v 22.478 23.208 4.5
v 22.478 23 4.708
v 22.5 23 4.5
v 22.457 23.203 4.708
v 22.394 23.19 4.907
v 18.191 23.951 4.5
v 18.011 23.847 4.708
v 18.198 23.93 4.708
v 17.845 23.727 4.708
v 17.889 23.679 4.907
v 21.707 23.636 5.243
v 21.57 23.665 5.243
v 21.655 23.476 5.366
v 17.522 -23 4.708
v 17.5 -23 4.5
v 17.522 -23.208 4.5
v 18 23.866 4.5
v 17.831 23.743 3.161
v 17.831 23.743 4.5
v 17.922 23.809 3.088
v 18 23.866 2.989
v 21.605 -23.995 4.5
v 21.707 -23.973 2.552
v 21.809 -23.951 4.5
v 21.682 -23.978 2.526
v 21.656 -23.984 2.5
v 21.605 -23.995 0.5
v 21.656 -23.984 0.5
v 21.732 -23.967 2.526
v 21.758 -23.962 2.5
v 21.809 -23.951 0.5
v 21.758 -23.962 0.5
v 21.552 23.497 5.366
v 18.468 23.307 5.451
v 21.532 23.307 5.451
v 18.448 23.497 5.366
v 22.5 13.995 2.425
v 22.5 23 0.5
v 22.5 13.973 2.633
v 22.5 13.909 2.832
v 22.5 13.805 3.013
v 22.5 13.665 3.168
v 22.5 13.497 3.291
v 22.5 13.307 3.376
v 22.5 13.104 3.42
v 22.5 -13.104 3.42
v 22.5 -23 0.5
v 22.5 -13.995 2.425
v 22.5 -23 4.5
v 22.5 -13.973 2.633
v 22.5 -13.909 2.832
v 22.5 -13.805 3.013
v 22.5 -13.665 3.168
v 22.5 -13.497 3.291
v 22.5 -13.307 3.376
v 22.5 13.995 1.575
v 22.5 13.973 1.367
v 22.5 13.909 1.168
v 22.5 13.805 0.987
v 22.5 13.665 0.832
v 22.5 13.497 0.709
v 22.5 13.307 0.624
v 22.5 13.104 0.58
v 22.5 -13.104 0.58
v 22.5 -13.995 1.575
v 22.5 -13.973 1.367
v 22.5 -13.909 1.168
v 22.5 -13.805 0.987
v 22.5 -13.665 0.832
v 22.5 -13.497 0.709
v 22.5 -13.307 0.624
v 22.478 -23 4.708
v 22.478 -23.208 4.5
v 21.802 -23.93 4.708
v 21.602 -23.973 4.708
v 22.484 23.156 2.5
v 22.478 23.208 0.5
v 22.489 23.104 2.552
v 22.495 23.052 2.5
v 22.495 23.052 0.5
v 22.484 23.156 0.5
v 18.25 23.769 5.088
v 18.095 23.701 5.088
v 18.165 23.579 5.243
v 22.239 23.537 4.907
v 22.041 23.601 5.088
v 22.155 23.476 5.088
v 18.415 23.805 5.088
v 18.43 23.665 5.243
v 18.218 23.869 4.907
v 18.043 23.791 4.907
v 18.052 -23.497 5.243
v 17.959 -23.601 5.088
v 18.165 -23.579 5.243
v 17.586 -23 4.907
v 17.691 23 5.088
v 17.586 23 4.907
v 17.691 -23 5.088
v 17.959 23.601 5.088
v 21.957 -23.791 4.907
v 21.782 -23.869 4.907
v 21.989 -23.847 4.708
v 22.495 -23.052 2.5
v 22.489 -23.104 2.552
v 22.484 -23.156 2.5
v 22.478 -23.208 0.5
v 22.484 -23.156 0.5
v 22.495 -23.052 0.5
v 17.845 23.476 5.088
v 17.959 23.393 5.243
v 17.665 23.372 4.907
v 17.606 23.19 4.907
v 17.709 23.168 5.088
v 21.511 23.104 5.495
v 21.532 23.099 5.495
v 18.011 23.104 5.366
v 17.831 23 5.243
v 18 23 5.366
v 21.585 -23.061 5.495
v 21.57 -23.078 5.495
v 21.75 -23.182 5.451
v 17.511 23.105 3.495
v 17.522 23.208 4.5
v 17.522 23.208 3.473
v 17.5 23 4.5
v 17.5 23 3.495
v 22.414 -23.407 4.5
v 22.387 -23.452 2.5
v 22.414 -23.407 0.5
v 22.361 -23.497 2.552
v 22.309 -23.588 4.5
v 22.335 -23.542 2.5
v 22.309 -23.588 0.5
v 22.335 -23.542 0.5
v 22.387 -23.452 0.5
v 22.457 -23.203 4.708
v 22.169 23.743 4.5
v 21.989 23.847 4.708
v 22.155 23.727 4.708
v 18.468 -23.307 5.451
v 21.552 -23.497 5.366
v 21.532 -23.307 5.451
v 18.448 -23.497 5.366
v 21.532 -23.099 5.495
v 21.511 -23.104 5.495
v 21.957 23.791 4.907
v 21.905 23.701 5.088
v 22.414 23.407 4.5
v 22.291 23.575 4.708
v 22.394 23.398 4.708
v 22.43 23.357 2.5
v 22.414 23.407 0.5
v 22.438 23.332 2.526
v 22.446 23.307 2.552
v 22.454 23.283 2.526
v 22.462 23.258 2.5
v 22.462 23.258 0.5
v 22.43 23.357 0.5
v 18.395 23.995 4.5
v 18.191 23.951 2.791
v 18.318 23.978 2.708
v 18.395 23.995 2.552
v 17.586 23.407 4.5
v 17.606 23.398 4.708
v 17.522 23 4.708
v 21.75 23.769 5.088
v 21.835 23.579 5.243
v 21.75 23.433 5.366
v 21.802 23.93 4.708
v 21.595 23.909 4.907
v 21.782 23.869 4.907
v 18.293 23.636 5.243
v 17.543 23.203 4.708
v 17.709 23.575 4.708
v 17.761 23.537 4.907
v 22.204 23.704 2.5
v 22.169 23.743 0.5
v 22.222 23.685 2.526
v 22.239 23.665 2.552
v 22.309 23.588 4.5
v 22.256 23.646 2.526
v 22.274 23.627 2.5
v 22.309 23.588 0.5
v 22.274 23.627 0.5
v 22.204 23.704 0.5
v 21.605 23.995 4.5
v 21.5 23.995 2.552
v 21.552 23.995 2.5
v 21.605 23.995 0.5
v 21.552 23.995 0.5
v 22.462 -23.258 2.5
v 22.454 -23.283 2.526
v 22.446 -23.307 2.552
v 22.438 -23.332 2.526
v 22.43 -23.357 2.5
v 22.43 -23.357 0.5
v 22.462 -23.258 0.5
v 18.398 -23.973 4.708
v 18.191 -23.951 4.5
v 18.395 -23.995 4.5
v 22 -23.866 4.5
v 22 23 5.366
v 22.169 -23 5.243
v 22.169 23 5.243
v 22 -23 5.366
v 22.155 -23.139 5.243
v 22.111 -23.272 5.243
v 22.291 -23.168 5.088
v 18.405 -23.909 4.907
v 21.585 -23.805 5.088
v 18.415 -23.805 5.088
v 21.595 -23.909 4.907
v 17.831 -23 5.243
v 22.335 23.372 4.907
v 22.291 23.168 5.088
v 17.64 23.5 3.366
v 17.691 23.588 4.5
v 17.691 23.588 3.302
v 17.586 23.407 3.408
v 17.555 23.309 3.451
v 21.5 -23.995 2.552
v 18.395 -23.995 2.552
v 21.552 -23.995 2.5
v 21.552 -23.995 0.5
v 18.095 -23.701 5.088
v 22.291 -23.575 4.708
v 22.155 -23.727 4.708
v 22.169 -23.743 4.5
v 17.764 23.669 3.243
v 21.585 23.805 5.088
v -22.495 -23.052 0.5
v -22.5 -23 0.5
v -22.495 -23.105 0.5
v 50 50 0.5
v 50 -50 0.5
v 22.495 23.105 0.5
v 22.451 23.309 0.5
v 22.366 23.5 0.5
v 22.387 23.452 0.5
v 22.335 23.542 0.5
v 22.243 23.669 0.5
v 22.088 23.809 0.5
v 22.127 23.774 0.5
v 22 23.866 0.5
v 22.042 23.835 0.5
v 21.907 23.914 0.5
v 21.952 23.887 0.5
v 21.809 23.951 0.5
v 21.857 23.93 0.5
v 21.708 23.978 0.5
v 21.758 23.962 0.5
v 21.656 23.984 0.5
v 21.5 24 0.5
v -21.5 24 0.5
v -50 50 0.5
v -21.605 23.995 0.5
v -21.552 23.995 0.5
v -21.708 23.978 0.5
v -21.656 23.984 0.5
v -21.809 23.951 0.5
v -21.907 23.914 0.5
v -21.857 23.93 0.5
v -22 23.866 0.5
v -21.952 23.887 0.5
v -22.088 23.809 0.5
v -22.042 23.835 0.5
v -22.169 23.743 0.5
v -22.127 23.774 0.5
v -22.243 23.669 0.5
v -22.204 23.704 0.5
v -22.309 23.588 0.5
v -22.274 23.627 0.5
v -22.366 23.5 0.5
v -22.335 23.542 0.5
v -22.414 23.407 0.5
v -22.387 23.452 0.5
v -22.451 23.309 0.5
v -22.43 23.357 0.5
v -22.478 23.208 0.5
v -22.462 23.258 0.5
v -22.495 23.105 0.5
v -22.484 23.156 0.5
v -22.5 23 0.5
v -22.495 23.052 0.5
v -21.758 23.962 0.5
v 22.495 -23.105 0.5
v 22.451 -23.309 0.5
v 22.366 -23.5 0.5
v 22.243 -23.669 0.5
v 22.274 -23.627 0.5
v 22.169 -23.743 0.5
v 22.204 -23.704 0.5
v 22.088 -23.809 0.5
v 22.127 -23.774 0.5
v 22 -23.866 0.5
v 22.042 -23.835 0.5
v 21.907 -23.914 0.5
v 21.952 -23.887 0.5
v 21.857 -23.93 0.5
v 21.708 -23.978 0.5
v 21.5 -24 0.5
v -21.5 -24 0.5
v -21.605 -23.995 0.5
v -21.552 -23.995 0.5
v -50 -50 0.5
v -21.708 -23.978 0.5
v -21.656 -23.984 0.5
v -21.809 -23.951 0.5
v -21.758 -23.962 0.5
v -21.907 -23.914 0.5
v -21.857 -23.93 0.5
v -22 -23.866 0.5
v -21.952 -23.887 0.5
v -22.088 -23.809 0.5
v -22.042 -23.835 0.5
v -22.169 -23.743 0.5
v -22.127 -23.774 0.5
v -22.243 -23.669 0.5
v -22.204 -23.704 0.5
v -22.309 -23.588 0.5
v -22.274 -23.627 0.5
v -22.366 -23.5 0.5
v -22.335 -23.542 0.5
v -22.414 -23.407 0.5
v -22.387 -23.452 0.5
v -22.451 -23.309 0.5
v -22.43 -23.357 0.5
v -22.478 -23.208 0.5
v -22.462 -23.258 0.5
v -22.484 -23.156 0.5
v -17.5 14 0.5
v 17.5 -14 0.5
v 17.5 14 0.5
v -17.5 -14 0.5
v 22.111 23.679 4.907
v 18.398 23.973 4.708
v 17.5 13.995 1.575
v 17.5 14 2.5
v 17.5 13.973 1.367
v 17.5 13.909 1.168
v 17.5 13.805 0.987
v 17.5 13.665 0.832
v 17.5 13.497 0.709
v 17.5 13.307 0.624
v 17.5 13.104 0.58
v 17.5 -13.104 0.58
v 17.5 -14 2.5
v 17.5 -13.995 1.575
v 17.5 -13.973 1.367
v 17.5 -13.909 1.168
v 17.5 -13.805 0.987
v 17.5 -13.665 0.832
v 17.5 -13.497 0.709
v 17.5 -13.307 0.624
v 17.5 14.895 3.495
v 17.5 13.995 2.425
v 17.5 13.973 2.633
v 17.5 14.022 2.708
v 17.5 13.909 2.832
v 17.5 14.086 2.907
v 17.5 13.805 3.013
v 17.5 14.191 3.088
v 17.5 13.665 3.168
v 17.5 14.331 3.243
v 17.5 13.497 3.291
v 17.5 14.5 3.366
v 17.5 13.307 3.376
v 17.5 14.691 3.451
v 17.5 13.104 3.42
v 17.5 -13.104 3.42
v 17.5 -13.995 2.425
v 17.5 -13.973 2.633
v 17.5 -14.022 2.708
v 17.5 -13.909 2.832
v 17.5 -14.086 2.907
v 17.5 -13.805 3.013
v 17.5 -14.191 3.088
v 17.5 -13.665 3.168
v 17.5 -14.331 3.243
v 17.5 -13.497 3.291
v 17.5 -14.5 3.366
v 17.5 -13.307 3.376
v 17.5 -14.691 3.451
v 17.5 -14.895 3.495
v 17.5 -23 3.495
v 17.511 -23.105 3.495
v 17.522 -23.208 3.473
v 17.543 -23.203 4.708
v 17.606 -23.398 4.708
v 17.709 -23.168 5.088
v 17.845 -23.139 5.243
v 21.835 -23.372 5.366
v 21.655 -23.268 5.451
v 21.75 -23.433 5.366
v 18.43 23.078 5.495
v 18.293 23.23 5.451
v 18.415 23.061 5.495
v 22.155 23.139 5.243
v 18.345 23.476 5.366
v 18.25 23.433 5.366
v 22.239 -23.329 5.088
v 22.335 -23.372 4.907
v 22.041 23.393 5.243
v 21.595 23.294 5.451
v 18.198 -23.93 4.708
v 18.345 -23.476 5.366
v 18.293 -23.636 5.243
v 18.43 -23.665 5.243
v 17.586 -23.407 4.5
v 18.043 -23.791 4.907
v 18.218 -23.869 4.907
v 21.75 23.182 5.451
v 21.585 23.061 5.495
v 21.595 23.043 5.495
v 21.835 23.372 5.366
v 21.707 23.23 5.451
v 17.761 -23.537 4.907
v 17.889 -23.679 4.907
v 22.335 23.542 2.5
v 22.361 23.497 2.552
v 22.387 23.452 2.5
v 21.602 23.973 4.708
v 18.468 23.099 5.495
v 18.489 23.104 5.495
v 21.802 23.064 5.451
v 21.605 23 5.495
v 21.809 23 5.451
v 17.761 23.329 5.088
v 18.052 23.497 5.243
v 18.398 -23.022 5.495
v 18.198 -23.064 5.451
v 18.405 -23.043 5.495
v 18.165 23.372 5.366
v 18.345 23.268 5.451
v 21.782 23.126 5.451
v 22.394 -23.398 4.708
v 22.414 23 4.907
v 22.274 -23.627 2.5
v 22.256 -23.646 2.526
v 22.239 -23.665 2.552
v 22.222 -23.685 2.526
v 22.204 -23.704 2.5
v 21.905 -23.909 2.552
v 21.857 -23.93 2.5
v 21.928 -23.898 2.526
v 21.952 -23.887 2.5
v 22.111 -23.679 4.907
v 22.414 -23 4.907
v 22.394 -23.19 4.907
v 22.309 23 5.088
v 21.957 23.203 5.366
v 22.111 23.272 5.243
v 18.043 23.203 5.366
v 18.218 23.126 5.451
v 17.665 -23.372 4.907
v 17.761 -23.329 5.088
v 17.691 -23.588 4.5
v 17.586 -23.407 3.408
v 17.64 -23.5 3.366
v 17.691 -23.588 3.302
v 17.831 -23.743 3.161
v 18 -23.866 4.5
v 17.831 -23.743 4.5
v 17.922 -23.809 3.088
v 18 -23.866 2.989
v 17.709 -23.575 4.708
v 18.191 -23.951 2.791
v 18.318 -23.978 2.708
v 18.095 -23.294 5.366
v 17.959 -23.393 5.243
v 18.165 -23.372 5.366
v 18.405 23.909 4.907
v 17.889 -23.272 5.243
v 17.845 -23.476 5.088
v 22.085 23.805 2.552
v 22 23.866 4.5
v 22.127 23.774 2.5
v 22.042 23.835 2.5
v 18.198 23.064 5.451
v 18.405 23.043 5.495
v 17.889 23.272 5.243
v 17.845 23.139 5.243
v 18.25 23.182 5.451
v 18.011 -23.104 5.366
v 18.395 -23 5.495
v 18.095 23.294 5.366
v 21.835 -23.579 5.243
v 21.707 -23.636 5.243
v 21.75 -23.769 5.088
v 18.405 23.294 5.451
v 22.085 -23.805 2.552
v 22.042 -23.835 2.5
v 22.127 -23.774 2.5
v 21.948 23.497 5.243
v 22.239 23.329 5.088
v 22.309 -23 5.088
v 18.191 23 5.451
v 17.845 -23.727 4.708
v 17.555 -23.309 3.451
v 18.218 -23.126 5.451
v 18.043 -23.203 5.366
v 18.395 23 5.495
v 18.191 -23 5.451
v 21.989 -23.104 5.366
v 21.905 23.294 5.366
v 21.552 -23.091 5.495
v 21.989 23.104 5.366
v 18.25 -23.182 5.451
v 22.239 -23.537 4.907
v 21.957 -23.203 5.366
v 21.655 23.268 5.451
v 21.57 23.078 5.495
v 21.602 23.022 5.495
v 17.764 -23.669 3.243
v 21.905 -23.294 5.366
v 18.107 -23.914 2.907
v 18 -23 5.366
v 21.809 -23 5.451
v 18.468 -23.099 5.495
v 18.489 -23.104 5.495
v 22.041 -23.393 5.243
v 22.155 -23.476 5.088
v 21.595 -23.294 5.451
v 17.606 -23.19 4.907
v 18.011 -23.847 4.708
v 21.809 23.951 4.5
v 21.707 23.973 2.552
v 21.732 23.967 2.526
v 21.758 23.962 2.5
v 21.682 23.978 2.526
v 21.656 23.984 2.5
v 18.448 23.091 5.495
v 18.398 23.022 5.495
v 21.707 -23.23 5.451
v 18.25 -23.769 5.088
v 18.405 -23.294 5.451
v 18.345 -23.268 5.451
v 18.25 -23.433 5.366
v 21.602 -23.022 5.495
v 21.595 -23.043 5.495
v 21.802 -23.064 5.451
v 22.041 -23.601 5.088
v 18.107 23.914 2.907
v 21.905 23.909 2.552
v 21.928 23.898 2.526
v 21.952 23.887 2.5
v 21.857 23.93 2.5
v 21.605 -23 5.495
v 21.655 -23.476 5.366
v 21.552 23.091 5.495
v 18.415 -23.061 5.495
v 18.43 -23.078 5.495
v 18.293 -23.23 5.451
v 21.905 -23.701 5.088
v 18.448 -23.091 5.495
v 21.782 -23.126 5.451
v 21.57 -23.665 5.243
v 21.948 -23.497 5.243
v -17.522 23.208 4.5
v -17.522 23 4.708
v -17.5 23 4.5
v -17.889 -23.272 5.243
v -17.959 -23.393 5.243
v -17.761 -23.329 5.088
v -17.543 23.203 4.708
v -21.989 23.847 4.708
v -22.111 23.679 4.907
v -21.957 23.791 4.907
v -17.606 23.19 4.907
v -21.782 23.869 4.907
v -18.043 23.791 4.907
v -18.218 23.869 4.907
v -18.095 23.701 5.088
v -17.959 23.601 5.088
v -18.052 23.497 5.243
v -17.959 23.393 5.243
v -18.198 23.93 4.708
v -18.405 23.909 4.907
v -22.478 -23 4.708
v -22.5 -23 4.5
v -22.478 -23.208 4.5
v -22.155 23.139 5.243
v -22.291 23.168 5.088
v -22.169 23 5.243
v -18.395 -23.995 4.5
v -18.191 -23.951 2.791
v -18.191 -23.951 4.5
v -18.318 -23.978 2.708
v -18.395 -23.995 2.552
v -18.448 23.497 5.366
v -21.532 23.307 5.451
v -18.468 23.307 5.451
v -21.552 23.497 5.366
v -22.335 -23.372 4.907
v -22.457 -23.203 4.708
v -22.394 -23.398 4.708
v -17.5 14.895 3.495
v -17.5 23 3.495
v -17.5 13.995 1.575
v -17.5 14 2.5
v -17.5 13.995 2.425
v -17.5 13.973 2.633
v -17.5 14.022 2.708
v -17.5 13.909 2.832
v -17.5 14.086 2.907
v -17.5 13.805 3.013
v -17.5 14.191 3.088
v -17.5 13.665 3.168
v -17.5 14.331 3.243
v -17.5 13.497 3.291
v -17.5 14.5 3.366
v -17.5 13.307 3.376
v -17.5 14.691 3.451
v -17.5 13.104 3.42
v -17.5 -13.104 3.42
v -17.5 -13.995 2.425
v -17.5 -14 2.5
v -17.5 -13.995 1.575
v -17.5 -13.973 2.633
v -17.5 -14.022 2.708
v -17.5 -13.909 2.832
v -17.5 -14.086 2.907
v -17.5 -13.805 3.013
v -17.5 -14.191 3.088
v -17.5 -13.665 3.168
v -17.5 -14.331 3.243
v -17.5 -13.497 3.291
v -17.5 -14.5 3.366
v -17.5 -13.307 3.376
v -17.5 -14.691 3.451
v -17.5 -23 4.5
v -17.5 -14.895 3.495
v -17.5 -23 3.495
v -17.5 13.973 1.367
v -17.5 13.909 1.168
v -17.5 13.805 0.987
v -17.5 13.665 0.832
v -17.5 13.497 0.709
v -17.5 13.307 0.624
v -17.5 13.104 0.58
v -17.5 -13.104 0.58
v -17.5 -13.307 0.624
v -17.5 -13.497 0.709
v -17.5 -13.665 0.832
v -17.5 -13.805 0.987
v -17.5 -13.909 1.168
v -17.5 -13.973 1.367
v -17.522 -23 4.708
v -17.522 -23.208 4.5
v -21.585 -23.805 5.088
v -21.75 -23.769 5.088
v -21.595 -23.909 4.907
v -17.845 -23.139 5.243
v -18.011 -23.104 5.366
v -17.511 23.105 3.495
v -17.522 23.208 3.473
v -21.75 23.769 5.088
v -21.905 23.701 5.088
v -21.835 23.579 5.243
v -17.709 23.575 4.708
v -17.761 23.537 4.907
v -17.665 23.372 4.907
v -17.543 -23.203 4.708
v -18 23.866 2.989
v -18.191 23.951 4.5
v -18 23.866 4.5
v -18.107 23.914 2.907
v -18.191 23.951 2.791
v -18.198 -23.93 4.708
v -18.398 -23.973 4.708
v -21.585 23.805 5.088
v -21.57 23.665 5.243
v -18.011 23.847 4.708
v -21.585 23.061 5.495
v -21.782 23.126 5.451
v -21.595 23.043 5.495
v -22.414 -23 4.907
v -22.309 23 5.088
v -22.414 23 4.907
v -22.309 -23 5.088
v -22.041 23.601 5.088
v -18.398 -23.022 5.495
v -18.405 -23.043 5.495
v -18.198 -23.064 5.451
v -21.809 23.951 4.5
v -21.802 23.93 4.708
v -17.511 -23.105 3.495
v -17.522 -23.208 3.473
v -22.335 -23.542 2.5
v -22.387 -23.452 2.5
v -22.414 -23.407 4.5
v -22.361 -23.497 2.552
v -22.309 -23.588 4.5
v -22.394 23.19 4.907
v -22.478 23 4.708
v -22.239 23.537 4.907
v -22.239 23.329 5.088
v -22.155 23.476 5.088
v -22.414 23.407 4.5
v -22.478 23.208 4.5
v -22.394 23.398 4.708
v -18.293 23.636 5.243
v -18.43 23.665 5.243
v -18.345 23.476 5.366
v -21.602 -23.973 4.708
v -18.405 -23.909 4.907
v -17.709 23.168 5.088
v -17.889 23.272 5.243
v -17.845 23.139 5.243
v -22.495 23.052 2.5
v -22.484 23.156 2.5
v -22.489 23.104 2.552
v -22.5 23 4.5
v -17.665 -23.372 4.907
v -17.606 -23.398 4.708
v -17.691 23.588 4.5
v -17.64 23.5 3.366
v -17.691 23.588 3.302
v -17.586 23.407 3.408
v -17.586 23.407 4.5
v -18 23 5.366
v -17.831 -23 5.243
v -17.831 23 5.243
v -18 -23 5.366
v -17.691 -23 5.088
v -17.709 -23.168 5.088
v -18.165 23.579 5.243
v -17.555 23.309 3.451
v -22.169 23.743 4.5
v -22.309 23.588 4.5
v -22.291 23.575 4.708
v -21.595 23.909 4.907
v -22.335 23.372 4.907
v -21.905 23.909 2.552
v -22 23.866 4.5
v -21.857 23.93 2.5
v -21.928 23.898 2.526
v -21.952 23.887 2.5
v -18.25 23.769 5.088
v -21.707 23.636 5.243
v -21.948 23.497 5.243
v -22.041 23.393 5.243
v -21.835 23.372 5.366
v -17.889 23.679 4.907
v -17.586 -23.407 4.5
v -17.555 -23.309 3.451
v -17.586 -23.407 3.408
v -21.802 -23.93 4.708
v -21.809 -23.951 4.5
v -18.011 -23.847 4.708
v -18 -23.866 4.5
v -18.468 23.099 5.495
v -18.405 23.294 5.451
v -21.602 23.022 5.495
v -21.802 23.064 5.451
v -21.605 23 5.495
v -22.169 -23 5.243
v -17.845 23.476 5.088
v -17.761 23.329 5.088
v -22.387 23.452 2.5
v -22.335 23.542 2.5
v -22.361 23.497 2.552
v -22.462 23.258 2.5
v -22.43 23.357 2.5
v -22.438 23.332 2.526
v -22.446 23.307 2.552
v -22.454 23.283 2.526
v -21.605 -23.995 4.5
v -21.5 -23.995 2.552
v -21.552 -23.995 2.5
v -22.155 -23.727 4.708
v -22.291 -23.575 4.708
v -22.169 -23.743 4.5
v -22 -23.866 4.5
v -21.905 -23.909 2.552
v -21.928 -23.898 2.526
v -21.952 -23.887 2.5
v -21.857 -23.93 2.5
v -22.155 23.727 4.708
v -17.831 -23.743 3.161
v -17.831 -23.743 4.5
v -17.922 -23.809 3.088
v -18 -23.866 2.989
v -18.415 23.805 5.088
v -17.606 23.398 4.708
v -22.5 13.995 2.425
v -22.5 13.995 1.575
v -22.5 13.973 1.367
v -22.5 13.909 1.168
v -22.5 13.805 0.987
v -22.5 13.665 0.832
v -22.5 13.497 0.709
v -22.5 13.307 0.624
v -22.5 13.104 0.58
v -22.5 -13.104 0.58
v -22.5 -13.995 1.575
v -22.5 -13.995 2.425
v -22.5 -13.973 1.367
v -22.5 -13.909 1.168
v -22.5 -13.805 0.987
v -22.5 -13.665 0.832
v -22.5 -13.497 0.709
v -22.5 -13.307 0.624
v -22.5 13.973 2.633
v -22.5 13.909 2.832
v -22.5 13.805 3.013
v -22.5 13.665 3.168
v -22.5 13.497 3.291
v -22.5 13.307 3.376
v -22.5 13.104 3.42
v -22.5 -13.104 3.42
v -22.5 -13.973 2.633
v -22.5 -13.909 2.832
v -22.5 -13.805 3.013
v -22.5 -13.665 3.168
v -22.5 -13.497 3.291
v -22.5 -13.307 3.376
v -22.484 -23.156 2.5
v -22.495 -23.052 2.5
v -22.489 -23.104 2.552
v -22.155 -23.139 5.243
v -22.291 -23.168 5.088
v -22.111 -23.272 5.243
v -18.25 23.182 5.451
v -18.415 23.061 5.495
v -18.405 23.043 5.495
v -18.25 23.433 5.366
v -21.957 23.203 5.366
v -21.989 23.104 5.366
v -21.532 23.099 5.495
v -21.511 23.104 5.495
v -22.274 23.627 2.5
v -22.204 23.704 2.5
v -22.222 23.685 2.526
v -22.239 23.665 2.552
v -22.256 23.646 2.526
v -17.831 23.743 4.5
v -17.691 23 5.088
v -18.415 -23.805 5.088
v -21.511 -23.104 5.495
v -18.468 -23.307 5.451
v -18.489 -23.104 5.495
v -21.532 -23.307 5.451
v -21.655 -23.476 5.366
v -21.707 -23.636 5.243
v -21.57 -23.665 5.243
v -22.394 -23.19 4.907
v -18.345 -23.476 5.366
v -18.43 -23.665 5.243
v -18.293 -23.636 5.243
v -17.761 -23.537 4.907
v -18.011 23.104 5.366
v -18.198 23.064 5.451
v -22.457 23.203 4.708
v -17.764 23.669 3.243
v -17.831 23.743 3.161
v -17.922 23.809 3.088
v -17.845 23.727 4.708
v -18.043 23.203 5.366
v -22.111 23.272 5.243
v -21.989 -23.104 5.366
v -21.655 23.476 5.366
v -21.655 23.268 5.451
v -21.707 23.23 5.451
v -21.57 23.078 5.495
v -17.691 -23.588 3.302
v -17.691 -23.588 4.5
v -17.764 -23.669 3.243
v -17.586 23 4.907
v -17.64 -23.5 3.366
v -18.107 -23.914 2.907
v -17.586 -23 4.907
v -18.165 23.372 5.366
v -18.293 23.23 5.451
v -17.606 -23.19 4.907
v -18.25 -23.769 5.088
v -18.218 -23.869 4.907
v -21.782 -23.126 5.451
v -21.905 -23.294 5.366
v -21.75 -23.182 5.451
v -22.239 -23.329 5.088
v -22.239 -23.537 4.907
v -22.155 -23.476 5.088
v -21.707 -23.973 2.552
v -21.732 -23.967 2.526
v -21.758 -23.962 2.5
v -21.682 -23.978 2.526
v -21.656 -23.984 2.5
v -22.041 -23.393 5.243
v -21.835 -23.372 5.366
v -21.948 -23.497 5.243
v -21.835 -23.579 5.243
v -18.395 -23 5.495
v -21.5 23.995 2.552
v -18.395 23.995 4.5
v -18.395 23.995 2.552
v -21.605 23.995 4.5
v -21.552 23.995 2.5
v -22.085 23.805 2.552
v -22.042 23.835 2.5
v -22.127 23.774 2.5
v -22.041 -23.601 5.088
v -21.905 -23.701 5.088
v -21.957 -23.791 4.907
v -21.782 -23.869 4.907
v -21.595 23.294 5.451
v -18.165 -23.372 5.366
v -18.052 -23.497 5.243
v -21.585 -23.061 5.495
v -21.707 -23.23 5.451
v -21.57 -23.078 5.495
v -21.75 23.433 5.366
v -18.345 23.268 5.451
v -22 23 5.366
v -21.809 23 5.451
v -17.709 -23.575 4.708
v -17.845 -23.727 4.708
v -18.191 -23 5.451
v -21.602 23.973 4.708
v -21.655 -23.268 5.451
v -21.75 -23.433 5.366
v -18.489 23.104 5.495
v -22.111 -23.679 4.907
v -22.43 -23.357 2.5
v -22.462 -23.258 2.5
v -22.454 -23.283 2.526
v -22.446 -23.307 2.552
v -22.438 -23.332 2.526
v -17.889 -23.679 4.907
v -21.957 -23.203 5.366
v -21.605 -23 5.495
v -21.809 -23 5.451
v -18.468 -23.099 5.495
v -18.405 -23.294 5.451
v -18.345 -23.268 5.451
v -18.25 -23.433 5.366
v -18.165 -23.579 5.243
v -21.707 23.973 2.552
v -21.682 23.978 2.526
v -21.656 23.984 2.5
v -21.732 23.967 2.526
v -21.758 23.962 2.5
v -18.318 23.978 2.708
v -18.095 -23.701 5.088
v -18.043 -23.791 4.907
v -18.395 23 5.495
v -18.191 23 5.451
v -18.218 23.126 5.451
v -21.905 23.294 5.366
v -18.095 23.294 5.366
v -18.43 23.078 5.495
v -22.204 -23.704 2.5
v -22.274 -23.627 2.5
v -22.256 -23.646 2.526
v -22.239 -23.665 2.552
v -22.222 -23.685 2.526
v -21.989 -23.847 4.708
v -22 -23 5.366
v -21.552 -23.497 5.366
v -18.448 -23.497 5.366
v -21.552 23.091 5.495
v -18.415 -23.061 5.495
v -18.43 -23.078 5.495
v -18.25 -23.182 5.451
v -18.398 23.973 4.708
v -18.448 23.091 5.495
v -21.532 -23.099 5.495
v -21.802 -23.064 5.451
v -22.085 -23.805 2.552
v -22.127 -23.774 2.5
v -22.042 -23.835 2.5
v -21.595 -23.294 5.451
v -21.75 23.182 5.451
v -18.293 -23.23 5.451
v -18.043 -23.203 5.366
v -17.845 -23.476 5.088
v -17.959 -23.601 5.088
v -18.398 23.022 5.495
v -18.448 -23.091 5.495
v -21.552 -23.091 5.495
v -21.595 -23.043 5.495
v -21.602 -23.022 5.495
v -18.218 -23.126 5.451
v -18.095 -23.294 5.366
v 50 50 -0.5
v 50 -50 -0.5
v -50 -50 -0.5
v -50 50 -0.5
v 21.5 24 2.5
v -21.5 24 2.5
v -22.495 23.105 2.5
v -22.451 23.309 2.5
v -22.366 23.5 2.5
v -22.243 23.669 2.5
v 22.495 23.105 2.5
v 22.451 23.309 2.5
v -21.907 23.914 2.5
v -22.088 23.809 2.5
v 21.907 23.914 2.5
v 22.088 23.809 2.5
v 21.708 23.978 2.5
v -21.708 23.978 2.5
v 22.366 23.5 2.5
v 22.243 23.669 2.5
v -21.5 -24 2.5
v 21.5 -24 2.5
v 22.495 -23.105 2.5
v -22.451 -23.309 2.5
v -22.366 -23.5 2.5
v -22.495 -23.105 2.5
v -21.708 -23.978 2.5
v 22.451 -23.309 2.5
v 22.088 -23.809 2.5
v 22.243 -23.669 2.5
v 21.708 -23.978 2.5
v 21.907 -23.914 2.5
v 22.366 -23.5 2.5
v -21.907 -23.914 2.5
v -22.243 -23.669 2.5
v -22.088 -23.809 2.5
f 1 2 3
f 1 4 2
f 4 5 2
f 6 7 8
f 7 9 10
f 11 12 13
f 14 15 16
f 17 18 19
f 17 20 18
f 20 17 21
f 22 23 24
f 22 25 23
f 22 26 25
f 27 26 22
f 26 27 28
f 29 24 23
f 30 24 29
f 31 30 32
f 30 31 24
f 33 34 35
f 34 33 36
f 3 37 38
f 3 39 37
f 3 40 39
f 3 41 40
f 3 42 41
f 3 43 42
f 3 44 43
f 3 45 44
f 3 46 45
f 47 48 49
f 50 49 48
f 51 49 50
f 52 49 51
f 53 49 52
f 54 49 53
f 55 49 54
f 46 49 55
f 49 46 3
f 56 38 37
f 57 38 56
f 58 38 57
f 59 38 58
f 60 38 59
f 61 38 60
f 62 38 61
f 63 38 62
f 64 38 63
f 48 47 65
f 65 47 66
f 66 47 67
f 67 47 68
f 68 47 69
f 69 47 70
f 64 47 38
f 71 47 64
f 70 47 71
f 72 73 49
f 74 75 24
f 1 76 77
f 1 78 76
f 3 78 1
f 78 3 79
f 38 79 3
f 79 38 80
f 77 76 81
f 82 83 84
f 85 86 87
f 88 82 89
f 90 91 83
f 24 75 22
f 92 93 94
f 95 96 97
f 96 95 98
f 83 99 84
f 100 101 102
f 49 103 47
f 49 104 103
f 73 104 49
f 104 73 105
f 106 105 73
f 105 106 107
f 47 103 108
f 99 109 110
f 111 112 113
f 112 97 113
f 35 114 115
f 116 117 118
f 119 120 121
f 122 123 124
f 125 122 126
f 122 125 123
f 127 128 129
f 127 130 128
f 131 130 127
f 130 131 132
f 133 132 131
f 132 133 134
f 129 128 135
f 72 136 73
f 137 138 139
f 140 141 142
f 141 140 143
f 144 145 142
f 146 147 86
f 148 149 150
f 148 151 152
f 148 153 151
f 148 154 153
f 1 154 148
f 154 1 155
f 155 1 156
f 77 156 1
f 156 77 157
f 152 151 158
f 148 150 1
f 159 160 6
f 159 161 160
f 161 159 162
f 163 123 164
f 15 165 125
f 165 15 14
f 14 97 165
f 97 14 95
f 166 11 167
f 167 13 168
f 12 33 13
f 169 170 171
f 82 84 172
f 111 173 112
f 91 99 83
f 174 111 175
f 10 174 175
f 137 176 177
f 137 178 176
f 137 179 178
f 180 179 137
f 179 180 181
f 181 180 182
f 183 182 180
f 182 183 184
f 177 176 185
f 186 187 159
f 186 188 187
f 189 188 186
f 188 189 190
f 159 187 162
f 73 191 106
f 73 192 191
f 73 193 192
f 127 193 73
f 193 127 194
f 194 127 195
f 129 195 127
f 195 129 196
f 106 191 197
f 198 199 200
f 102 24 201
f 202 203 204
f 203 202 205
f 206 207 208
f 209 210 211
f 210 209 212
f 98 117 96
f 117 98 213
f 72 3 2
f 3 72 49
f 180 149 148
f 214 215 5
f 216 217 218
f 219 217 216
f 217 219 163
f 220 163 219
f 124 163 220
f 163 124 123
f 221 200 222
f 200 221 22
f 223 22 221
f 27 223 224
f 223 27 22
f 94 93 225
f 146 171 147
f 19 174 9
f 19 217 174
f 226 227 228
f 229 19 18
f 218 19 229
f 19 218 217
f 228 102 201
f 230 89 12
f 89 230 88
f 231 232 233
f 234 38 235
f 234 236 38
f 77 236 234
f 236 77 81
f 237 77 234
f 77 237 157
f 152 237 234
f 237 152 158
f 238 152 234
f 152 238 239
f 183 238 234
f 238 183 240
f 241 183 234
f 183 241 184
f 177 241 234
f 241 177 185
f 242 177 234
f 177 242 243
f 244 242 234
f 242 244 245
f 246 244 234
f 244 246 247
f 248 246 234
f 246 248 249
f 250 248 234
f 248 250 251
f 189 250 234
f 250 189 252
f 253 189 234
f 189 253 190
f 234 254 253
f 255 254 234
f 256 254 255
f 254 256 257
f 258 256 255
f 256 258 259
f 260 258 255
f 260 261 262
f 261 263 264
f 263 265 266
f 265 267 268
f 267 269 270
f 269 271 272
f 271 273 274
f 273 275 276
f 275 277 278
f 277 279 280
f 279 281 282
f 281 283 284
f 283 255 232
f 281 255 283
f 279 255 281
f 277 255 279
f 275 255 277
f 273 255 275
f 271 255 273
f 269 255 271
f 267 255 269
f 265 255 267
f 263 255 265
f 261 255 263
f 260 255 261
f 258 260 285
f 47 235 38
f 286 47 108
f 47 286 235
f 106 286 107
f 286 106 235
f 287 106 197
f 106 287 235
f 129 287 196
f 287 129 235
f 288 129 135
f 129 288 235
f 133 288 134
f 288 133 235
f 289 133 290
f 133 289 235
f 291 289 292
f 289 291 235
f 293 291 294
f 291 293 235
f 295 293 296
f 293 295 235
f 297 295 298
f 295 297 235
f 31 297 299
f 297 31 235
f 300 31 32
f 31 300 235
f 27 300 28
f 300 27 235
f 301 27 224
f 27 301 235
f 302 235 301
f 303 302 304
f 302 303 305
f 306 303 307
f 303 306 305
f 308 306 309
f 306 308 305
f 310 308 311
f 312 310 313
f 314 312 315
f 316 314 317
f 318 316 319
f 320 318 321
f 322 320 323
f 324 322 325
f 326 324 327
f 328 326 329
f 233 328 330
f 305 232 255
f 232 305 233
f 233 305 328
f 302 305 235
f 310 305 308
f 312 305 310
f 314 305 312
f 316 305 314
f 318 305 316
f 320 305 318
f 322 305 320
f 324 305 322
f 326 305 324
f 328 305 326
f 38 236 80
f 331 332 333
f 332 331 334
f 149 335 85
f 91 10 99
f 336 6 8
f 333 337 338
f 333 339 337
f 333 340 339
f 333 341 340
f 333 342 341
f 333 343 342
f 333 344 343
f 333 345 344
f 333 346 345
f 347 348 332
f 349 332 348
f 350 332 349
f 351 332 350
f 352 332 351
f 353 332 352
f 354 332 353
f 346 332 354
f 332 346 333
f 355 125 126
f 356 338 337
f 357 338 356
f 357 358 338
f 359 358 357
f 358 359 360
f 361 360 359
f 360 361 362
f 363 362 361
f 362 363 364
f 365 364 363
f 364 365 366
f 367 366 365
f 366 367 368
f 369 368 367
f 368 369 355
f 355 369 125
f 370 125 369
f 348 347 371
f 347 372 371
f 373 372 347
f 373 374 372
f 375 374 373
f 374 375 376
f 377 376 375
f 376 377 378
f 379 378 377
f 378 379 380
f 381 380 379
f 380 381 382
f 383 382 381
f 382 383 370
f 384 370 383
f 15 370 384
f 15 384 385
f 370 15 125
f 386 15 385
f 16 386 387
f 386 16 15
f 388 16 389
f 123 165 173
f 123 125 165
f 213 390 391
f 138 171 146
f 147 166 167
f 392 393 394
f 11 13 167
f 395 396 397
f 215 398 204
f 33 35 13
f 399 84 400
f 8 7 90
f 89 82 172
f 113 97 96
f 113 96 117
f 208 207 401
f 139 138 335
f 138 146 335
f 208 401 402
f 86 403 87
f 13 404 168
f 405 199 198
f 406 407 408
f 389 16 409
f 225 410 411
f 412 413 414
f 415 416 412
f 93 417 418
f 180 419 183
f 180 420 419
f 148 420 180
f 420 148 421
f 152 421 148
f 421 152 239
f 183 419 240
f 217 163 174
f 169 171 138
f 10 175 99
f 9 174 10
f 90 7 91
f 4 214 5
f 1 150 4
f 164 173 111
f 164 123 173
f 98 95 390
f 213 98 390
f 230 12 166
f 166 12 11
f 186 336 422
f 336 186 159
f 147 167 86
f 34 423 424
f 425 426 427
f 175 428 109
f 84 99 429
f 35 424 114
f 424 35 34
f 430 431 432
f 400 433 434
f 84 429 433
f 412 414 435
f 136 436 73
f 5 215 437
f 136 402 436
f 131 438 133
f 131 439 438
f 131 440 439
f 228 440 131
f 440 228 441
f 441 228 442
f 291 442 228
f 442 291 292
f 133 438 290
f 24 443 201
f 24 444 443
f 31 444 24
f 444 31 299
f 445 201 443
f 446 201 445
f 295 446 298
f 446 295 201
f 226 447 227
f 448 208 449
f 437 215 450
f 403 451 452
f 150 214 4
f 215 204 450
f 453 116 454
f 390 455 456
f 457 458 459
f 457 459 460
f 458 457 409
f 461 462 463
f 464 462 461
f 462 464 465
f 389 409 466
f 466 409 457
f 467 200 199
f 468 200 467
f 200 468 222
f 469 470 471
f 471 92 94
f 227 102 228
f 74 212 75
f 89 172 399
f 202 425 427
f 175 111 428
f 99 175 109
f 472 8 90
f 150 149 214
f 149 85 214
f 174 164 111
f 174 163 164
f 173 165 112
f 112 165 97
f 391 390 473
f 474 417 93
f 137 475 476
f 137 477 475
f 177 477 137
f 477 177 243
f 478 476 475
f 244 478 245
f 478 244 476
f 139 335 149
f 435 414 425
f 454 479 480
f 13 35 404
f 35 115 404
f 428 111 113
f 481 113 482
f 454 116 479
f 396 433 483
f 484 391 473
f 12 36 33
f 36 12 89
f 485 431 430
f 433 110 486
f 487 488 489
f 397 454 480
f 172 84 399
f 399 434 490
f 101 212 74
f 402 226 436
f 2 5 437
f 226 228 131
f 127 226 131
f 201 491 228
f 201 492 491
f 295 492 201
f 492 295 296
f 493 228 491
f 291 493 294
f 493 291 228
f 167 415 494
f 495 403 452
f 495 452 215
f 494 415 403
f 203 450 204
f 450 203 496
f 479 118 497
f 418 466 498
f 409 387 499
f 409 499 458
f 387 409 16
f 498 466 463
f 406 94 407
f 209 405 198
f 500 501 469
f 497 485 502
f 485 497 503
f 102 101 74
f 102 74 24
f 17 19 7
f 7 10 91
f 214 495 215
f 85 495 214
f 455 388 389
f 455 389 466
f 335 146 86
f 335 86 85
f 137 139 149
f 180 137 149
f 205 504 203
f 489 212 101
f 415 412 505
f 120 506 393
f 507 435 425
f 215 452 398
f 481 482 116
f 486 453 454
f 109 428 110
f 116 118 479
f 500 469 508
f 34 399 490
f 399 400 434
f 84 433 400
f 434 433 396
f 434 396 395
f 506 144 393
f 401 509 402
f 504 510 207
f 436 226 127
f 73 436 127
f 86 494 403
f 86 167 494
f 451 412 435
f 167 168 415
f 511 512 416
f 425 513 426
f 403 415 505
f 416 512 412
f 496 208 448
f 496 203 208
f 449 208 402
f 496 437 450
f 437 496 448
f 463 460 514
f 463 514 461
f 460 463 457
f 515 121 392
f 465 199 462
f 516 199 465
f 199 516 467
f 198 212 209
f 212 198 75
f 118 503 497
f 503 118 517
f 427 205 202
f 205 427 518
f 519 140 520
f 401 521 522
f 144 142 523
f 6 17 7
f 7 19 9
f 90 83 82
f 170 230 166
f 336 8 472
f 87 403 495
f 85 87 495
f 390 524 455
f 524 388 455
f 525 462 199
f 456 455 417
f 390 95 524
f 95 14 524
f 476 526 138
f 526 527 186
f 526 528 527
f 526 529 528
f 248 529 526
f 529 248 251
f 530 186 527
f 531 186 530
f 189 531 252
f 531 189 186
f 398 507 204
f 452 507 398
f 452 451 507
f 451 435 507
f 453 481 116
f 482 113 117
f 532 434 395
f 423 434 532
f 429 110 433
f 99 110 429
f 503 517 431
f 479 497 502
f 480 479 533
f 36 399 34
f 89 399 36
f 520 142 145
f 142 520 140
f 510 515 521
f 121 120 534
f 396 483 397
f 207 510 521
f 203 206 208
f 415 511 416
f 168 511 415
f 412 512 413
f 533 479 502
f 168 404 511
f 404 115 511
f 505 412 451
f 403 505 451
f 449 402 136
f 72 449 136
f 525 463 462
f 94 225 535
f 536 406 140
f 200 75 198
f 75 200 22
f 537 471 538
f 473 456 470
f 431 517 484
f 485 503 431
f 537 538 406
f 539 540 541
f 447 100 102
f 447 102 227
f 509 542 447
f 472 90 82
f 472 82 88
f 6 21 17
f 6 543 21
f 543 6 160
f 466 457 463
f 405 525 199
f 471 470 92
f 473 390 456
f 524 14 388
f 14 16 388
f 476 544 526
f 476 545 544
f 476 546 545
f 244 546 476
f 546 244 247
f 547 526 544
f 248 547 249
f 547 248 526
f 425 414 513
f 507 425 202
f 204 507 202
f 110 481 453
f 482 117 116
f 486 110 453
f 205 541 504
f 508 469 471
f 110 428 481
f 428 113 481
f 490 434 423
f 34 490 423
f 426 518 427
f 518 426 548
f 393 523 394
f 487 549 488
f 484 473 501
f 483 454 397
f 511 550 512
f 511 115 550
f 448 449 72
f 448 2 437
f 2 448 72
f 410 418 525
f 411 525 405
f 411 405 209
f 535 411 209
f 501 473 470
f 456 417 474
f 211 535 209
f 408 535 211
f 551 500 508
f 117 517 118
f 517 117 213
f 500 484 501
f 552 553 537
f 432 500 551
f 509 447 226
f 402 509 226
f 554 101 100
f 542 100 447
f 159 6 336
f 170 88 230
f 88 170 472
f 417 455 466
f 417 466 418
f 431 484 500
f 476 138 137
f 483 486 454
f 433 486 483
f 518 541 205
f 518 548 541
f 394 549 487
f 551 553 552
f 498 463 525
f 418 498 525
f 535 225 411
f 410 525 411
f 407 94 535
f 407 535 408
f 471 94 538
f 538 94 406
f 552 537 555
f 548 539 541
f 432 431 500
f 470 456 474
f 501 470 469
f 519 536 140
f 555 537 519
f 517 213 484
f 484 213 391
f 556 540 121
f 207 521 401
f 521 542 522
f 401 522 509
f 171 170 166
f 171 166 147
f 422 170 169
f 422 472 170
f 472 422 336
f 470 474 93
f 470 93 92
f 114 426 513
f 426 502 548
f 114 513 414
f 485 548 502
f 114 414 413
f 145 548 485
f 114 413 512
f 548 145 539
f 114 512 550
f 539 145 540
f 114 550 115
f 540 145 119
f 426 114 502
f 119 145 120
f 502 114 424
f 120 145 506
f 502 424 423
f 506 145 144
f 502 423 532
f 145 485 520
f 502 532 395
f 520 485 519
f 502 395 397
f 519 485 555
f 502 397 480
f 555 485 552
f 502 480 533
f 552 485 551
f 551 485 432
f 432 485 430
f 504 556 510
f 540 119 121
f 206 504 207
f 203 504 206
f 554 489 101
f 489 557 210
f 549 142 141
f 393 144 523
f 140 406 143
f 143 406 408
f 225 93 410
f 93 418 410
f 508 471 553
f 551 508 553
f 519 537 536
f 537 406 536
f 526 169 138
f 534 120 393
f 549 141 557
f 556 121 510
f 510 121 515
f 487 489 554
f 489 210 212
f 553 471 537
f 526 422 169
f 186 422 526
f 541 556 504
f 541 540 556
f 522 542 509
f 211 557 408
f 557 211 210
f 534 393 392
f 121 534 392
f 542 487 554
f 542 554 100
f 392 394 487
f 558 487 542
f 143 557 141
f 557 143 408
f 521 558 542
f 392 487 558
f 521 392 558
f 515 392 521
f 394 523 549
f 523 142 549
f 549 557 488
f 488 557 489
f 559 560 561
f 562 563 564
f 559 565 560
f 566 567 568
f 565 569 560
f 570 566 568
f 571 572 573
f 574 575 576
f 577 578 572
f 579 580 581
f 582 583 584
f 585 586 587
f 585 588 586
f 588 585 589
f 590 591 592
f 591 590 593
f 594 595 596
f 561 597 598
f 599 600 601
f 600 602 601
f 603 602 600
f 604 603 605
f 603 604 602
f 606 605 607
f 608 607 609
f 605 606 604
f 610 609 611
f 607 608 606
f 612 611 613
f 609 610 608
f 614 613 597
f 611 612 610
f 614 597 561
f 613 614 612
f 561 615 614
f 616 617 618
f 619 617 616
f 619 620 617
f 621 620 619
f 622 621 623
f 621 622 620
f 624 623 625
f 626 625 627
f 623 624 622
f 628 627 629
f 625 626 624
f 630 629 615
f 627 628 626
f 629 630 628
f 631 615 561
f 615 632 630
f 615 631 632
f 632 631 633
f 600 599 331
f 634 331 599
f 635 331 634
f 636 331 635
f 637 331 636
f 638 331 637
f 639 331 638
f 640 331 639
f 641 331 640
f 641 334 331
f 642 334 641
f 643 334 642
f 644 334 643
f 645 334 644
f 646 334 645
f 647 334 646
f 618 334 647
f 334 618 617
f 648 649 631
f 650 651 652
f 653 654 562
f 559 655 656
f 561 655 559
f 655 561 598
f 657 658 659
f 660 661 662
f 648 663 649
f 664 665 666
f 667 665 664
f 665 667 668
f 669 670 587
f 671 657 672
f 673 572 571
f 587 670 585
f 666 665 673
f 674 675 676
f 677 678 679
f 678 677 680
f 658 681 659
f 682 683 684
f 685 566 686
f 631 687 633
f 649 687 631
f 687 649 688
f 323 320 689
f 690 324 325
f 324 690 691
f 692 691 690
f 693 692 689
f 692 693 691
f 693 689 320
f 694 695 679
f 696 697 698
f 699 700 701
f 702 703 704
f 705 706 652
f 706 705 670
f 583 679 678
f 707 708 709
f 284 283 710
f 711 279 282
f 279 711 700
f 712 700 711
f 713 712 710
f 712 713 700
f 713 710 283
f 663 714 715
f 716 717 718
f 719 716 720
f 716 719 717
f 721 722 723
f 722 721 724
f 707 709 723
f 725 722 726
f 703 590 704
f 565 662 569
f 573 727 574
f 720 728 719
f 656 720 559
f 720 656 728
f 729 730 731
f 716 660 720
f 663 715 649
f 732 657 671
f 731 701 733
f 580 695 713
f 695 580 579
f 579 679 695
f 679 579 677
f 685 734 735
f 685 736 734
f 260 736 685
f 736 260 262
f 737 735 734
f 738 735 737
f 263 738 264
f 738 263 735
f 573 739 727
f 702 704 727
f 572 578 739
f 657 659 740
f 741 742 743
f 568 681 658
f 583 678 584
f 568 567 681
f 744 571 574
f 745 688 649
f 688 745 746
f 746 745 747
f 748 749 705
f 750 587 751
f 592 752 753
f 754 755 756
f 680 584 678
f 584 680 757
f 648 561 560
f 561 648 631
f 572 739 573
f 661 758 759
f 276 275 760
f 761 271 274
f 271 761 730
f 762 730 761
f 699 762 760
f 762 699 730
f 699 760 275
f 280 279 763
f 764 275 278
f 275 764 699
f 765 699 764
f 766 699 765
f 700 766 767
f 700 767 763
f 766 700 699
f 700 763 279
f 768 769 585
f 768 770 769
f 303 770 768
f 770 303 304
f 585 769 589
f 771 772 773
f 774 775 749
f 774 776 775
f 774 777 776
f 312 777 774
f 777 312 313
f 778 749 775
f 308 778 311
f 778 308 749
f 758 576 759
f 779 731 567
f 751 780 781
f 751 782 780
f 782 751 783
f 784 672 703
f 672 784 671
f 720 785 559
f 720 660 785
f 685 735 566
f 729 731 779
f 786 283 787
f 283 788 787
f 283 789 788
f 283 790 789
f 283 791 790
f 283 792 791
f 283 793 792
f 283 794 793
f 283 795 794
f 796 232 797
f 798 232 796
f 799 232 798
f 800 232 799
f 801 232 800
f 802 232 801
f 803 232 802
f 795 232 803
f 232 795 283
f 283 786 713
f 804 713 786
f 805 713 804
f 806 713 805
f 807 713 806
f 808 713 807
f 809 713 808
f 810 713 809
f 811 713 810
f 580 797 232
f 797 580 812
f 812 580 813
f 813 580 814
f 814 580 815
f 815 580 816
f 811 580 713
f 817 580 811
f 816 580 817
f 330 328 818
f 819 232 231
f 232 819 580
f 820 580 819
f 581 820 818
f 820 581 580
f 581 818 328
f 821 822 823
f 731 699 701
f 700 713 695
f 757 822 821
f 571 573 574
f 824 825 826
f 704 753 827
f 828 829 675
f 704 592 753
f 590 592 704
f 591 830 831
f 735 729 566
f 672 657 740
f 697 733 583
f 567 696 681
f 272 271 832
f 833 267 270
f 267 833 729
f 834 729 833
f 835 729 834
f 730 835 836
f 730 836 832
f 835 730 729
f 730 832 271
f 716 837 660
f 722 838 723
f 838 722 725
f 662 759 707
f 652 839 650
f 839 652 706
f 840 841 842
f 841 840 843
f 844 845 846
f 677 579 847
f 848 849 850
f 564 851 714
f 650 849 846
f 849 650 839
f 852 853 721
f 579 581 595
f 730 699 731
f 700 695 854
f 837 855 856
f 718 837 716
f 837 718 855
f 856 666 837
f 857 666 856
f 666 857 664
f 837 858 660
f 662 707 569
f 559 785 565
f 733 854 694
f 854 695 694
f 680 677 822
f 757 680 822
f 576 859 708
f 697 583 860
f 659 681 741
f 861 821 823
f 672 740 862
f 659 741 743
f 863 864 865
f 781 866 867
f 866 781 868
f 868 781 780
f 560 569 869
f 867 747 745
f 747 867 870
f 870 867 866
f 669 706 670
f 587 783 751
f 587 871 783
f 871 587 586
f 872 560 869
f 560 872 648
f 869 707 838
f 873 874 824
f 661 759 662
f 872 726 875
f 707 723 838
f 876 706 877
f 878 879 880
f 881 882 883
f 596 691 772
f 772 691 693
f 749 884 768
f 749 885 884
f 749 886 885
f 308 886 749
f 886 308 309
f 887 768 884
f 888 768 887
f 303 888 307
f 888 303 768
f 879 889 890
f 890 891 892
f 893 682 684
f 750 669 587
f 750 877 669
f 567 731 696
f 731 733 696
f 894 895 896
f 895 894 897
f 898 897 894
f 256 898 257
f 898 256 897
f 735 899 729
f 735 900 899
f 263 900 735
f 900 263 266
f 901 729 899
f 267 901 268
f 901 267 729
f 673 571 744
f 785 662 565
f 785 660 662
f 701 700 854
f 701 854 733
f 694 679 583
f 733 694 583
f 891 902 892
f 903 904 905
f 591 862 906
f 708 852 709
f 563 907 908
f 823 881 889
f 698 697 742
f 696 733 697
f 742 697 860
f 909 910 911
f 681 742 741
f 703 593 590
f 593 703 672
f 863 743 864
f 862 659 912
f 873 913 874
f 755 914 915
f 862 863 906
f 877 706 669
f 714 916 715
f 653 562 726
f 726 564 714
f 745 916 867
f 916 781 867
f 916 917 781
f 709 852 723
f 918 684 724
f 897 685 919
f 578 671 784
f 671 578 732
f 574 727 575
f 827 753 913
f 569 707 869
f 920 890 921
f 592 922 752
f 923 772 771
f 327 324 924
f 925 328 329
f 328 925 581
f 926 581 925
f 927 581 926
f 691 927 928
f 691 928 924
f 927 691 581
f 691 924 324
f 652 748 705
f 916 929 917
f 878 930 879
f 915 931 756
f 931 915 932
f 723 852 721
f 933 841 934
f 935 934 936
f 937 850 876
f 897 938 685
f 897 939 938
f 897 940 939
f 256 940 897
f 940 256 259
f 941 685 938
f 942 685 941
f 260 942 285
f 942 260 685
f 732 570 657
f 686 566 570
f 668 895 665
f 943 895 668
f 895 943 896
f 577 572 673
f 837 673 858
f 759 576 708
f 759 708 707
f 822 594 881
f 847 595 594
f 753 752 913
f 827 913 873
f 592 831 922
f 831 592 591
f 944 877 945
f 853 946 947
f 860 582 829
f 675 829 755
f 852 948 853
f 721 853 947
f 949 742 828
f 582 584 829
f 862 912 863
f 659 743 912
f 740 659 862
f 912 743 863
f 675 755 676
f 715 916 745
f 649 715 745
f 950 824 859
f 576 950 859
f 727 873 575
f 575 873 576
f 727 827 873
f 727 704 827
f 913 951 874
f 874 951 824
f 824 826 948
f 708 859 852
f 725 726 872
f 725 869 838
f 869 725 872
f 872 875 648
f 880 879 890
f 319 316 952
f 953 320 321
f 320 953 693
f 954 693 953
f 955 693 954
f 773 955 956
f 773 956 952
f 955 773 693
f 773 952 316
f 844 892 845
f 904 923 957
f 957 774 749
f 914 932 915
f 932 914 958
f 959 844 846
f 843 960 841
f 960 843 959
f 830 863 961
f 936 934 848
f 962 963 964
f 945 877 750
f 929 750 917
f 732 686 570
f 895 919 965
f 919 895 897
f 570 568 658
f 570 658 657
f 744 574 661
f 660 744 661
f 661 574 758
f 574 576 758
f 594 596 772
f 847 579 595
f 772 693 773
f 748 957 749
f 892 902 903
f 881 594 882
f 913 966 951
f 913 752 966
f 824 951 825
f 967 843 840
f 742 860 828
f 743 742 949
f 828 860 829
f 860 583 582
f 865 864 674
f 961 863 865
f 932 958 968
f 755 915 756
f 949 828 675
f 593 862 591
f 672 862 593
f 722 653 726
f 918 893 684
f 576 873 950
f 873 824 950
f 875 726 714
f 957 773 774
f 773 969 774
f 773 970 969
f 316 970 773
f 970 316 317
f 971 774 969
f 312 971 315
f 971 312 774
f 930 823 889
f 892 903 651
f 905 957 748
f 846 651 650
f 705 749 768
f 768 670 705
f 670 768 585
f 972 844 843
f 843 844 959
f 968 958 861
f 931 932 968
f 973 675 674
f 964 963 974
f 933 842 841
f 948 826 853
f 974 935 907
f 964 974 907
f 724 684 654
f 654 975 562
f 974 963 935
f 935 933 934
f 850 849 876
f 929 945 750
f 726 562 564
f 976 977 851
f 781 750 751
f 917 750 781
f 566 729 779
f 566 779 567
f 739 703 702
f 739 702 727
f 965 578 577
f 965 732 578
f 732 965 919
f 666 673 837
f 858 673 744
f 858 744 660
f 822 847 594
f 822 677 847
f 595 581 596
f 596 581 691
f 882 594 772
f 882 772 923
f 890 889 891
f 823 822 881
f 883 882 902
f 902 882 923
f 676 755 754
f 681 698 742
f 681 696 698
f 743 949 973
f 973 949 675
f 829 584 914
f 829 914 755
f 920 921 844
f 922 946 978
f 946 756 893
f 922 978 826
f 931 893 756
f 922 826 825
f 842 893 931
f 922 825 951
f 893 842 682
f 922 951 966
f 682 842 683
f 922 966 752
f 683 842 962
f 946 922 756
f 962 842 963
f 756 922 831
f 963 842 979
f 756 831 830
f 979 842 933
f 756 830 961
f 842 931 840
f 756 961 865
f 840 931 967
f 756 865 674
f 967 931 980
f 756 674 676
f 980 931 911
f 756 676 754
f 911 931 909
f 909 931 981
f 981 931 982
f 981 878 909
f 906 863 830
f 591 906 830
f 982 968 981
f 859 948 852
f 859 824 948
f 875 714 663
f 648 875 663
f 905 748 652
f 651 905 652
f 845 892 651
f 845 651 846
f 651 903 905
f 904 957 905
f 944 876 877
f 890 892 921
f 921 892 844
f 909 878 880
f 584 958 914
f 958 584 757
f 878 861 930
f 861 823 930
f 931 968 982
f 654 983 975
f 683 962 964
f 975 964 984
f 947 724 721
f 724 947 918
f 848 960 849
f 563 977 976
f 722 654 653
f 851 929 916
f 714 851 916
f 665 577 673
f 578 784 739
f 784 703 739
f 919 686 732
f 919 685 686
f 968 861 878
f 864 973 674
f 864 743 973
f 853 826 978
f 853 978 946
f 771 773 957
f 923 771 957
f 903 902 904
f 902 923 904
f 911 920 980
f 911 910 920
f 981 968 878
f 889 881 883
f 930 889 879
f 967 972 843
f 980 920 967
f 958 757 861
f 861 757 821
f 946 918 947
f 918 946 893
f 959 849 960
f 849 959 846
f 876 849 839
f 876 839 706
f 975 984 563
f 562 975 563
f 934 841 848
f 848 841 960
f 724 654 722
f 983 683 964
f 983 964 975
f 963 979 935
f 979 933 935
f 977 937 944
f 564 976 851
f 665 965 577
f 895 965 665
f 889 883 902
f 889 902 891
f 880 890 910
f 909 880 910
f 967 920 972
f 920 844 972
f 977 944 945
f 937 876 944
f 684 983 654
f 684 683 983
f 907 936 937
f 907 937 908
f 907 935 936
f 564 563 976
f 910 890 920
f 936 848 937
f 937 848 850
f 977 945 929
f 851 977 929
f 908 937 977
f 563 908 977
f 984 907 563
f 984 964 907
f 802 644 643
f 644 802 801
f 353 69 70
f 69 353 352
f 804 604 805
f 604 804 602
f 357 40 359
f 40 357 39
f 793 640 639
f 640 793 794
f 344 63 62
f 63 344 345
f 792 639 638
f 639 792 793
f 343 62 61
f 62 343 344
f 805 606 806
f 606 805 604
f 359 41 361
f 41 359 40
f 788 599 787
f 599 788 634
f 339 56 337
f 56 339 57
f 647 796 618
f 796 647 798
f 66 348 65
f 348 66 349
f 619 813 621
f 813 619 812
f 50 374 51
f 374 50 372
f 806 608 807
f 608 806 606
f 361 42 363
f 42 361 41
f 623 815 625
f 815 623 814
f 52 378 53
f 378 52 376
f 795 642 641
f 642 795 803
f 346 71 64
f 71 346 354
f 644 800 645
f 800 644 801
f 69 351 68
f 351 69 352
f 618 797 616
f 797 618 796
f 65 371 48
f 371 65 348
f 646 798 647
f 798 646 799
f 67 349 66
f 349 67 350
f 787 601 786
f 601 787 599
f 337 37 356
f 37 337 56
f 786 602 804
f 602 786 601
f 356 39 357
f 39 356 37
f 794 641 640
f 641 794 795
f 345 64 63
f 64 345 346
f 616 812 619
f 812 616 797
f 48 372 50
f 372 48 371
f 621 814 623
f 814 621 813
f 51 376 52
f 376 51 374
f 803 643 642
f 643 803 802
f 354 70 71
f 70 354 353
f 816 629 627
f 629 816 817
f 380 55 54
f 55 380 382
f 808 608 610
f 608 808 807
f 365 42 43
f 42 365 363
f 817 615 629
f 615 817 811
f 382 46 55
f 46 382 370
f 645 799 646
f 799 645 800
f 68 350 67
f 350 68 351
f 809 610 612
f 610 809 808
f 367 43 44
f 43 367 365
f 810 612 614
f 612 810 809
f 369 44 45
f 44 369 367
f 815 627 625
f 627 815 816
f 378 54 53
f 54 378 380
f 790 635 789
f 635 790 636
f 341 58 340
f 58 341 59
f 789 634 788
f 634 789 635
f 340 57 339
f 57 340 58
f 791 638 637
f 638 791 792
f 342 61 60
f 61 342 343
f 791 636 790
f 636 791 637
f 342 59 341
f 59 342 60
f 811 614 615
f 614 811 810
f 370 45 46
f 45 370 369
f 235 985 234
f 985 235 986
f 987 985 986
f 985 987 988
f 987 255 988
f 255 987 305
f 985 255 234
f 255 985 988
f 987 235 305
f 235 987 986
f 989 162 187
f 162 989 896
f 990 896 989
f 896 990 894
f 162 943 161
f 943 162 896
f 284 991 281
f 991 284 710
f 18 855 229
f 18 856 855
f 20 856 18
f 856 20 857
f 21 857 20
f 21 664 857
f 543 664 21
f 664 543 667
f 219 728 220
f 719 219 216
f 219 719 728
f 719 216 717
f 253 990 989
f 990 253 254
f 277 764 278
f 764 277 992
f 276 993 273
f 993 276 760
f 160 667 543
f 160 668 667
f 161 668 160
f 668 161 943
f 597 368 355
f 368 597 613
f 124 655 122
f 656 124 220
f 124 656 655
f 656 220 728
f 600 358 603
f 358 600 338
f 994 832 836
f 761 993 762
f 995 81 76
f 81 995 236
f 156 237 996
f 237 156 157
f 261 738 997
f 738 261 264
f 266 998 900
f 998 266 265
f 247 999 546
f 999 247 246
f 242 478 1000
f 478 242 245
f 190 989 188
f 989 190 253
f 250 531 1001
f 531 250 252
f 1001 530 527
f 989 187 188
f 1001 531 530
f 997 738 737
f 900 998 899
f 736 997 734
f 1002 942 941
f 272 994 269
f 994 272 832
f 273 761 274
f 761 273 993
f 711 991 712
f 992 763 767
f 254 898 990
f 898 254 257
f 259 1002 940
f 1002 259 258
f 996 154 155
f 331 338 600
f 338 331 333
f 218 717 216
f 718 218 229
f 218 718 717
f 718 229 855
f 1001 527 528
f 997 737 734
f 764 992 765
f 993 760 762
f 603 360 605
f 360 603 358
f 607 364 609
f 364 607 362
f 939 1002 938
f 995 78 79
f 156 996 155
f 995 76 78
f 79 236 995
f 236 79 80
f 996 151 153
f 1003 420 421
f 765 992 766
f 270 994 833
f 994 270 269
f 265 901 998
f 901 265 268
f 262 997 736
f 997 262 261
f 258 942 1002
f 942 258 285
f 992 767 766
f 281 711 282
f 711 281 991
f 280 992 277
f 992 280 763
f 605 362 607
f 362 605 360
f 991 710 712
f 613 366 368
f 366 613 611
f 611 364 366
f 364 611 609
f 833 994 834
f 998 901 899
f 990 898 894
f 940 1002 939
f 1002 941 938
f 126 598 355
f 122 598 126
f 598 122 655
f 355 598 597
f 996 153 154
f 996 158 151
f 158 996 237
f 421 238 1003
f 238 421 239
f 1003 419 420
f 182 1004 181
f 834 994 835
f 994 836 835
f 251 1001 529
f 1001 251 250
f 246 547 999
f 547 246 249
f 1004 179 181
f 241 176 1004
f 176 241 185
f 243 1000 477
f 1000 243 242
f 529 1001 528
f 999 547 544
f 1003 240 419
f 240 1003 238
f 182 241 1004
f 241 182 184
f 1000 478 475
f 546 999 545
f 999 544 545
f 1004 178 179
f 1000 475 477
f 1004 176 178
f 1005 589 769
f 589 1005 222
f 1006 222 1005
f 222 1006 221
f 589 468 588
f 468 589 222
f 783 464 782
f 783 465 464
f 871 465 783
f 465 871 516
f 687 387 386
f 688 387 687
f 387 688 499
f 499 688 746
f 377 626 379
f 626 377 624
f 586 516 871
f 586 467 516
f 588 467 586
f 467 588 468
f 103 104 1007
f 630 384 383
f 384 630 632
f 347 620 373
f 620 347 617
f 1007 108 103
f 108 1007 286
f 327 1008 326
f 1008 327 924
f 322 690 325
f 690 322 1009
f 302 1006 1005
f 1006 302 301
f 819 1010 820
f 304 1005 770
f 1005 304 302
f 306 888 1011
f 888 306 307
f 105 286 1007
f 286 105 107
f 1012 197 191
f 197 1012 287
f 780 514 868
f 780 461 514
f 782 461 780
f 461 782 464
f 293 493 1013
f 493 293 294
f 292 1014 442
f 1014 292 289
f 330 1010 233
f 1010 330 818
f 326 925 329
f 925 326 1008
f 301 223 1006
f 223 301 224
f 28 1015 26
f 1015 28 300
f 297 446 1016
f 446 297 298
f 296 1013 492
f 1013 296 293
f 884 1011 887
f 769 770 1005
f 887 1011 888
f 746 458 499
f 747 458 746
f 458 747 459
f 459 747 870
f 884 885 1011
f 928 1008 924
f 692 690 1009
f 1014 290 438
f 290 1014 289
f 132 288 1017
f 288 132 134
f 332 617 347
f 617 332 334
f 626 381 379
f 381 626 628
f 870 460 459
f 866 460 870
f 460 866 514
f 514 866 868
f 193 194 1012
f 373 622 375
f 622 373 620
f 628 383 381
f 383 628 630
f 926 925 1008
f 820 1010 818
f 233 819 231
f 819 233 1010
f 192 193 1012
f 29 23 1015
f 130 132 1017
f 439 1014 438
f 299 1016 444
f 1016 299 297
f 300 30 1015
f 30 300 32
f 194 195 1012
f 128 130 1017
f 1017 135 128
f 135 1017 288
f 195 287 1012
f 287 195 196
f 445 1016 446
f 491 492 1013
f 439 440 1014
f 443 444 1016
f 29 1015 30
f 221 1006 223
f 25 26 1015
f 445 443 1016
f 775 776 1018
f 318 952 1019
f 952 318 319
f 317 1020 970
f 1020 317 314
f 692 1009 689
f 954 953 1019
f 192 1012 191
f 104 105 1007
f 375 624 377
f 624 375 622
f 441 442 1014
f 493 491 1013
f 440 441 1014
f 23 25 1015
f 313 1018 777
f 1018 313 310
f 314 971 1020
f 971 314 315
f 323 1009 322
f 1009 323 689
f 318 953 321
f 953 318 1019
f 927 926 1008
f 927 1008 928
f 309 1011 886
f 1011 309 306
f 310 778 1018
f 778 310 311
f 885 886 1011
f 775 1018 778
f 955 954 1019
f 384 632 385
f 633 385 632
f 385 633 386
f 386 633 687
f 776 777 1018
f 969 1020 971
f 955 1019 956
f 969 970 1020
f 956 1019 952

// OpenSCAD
side = 100;
belt_width= 28;
belt_handle_distance = 40;
belt_handle_height = 5;
belt_handle_thickness = 20;
belt_handle_width = 5;
belt_z_thickness = 3;
plate_thickness = 1;

translate([0,0,0]) cube([side,side,plate_thickness], center= true);

$fs = 0.15;

module roundedcube(size = [1, 1, 1], center = false, radius = 0.5, apply_to = "all") {
	// If single value, convert to [x, y, z] vector
	size = (size[0] == undef) ? [size, size, size] : size;

	translate_min = radius;
	translate_xmax = size[0] - radius;
	translate_ymax = size[1] - radius;
	translate_zmax = size[2] - radius;

	diameter = radius * 2;

	obj_translate = (center == false) ?
		[0, 0, 0] : [
		-(size[0] / 2),
		-(size[1] / 2),
		-(size[2] / 2)
		];

	translate(v = obj_translate) {
		hull() {
			for (translate_x = [translate_min, translate_xmax]) {
				x_at = (translate_x == translate_min) ? "min" : "max";
				for (translate_y = [translate_min, translate_ymax]) {
					y_at = (translate_y == translate_min) ? "min" : "max";
					for (translate_z = [translate_min, translate_zmax]) {
						z_at = (translate_z == translate_min) ? "min" : "max";

						translate(v = [translate_x, translate_y, translate_z])
							if (
									(apply_to == "all") ||
									(apply_to == "xmin" && x_at == "min") || (apply_to == "xmax" && x_at == "max") ||
									(apply_to == "ymin" && y_at == "min") || (apply_to == "ymax" && y_at == "max") ||
									(apply_to == "zmin" && z_at == "min") || (apply_to == "zmax" && z_at == "max")
							   ) {
								sphere(r = radius);
							} else {
								rotate = 
									(apply_to == "xmin" || apply_to == "xmax" || apply_to == "x") ? [0, 90, 0] : (
											(apply_to == "ymin" || apply_to == "ymax" || apply_to == "y") ? [90, 90, 0] :
											[0, 0, 0]
											);
								rotate(a = rotate)
									cylinder(h = diameter, r = radius, center = true);
							}
					}
				}
			}
		}
	}
}




module actual_handle()
{
	roundedcube([belt_handle_width ,belt_width+belt_handle_thickness,belt_handle_height], true, 01, "zmax");
	//#cube([3,belt_width,belt_handle_height], center = true);
}

module handles_solids()
{
	translate([belt_handle_distance/2,0,belt_handle_height/2+plate_thickness/2])
		actual_handle();

	translate([-belt_handle_distance/2,0,belt_handle_height/2+plate_thickness/2])
		actual_handle();
}
difference(){

	{
		handles_solids();
	}
	translate([0,0,plate_thickness/2+belt_z_thickness/2])
		roundedcube([side,belt_width,belt_z_thickness-$fs], true,01);
}

module reinforcement()
{
	translate([(belt_width+belt_handle_thickness/2)/2,0,plate_thickness/2+belt_z_thickness/2]) roundedcube([belt_handle_thickness/2,belt_handle_distance+belt_handle_width ,belt_z_thickness], true, 01, "zmax");

}

rotate([0,0,90]) reinforcement();
rotate([0,0,-90]) reinforcement();
